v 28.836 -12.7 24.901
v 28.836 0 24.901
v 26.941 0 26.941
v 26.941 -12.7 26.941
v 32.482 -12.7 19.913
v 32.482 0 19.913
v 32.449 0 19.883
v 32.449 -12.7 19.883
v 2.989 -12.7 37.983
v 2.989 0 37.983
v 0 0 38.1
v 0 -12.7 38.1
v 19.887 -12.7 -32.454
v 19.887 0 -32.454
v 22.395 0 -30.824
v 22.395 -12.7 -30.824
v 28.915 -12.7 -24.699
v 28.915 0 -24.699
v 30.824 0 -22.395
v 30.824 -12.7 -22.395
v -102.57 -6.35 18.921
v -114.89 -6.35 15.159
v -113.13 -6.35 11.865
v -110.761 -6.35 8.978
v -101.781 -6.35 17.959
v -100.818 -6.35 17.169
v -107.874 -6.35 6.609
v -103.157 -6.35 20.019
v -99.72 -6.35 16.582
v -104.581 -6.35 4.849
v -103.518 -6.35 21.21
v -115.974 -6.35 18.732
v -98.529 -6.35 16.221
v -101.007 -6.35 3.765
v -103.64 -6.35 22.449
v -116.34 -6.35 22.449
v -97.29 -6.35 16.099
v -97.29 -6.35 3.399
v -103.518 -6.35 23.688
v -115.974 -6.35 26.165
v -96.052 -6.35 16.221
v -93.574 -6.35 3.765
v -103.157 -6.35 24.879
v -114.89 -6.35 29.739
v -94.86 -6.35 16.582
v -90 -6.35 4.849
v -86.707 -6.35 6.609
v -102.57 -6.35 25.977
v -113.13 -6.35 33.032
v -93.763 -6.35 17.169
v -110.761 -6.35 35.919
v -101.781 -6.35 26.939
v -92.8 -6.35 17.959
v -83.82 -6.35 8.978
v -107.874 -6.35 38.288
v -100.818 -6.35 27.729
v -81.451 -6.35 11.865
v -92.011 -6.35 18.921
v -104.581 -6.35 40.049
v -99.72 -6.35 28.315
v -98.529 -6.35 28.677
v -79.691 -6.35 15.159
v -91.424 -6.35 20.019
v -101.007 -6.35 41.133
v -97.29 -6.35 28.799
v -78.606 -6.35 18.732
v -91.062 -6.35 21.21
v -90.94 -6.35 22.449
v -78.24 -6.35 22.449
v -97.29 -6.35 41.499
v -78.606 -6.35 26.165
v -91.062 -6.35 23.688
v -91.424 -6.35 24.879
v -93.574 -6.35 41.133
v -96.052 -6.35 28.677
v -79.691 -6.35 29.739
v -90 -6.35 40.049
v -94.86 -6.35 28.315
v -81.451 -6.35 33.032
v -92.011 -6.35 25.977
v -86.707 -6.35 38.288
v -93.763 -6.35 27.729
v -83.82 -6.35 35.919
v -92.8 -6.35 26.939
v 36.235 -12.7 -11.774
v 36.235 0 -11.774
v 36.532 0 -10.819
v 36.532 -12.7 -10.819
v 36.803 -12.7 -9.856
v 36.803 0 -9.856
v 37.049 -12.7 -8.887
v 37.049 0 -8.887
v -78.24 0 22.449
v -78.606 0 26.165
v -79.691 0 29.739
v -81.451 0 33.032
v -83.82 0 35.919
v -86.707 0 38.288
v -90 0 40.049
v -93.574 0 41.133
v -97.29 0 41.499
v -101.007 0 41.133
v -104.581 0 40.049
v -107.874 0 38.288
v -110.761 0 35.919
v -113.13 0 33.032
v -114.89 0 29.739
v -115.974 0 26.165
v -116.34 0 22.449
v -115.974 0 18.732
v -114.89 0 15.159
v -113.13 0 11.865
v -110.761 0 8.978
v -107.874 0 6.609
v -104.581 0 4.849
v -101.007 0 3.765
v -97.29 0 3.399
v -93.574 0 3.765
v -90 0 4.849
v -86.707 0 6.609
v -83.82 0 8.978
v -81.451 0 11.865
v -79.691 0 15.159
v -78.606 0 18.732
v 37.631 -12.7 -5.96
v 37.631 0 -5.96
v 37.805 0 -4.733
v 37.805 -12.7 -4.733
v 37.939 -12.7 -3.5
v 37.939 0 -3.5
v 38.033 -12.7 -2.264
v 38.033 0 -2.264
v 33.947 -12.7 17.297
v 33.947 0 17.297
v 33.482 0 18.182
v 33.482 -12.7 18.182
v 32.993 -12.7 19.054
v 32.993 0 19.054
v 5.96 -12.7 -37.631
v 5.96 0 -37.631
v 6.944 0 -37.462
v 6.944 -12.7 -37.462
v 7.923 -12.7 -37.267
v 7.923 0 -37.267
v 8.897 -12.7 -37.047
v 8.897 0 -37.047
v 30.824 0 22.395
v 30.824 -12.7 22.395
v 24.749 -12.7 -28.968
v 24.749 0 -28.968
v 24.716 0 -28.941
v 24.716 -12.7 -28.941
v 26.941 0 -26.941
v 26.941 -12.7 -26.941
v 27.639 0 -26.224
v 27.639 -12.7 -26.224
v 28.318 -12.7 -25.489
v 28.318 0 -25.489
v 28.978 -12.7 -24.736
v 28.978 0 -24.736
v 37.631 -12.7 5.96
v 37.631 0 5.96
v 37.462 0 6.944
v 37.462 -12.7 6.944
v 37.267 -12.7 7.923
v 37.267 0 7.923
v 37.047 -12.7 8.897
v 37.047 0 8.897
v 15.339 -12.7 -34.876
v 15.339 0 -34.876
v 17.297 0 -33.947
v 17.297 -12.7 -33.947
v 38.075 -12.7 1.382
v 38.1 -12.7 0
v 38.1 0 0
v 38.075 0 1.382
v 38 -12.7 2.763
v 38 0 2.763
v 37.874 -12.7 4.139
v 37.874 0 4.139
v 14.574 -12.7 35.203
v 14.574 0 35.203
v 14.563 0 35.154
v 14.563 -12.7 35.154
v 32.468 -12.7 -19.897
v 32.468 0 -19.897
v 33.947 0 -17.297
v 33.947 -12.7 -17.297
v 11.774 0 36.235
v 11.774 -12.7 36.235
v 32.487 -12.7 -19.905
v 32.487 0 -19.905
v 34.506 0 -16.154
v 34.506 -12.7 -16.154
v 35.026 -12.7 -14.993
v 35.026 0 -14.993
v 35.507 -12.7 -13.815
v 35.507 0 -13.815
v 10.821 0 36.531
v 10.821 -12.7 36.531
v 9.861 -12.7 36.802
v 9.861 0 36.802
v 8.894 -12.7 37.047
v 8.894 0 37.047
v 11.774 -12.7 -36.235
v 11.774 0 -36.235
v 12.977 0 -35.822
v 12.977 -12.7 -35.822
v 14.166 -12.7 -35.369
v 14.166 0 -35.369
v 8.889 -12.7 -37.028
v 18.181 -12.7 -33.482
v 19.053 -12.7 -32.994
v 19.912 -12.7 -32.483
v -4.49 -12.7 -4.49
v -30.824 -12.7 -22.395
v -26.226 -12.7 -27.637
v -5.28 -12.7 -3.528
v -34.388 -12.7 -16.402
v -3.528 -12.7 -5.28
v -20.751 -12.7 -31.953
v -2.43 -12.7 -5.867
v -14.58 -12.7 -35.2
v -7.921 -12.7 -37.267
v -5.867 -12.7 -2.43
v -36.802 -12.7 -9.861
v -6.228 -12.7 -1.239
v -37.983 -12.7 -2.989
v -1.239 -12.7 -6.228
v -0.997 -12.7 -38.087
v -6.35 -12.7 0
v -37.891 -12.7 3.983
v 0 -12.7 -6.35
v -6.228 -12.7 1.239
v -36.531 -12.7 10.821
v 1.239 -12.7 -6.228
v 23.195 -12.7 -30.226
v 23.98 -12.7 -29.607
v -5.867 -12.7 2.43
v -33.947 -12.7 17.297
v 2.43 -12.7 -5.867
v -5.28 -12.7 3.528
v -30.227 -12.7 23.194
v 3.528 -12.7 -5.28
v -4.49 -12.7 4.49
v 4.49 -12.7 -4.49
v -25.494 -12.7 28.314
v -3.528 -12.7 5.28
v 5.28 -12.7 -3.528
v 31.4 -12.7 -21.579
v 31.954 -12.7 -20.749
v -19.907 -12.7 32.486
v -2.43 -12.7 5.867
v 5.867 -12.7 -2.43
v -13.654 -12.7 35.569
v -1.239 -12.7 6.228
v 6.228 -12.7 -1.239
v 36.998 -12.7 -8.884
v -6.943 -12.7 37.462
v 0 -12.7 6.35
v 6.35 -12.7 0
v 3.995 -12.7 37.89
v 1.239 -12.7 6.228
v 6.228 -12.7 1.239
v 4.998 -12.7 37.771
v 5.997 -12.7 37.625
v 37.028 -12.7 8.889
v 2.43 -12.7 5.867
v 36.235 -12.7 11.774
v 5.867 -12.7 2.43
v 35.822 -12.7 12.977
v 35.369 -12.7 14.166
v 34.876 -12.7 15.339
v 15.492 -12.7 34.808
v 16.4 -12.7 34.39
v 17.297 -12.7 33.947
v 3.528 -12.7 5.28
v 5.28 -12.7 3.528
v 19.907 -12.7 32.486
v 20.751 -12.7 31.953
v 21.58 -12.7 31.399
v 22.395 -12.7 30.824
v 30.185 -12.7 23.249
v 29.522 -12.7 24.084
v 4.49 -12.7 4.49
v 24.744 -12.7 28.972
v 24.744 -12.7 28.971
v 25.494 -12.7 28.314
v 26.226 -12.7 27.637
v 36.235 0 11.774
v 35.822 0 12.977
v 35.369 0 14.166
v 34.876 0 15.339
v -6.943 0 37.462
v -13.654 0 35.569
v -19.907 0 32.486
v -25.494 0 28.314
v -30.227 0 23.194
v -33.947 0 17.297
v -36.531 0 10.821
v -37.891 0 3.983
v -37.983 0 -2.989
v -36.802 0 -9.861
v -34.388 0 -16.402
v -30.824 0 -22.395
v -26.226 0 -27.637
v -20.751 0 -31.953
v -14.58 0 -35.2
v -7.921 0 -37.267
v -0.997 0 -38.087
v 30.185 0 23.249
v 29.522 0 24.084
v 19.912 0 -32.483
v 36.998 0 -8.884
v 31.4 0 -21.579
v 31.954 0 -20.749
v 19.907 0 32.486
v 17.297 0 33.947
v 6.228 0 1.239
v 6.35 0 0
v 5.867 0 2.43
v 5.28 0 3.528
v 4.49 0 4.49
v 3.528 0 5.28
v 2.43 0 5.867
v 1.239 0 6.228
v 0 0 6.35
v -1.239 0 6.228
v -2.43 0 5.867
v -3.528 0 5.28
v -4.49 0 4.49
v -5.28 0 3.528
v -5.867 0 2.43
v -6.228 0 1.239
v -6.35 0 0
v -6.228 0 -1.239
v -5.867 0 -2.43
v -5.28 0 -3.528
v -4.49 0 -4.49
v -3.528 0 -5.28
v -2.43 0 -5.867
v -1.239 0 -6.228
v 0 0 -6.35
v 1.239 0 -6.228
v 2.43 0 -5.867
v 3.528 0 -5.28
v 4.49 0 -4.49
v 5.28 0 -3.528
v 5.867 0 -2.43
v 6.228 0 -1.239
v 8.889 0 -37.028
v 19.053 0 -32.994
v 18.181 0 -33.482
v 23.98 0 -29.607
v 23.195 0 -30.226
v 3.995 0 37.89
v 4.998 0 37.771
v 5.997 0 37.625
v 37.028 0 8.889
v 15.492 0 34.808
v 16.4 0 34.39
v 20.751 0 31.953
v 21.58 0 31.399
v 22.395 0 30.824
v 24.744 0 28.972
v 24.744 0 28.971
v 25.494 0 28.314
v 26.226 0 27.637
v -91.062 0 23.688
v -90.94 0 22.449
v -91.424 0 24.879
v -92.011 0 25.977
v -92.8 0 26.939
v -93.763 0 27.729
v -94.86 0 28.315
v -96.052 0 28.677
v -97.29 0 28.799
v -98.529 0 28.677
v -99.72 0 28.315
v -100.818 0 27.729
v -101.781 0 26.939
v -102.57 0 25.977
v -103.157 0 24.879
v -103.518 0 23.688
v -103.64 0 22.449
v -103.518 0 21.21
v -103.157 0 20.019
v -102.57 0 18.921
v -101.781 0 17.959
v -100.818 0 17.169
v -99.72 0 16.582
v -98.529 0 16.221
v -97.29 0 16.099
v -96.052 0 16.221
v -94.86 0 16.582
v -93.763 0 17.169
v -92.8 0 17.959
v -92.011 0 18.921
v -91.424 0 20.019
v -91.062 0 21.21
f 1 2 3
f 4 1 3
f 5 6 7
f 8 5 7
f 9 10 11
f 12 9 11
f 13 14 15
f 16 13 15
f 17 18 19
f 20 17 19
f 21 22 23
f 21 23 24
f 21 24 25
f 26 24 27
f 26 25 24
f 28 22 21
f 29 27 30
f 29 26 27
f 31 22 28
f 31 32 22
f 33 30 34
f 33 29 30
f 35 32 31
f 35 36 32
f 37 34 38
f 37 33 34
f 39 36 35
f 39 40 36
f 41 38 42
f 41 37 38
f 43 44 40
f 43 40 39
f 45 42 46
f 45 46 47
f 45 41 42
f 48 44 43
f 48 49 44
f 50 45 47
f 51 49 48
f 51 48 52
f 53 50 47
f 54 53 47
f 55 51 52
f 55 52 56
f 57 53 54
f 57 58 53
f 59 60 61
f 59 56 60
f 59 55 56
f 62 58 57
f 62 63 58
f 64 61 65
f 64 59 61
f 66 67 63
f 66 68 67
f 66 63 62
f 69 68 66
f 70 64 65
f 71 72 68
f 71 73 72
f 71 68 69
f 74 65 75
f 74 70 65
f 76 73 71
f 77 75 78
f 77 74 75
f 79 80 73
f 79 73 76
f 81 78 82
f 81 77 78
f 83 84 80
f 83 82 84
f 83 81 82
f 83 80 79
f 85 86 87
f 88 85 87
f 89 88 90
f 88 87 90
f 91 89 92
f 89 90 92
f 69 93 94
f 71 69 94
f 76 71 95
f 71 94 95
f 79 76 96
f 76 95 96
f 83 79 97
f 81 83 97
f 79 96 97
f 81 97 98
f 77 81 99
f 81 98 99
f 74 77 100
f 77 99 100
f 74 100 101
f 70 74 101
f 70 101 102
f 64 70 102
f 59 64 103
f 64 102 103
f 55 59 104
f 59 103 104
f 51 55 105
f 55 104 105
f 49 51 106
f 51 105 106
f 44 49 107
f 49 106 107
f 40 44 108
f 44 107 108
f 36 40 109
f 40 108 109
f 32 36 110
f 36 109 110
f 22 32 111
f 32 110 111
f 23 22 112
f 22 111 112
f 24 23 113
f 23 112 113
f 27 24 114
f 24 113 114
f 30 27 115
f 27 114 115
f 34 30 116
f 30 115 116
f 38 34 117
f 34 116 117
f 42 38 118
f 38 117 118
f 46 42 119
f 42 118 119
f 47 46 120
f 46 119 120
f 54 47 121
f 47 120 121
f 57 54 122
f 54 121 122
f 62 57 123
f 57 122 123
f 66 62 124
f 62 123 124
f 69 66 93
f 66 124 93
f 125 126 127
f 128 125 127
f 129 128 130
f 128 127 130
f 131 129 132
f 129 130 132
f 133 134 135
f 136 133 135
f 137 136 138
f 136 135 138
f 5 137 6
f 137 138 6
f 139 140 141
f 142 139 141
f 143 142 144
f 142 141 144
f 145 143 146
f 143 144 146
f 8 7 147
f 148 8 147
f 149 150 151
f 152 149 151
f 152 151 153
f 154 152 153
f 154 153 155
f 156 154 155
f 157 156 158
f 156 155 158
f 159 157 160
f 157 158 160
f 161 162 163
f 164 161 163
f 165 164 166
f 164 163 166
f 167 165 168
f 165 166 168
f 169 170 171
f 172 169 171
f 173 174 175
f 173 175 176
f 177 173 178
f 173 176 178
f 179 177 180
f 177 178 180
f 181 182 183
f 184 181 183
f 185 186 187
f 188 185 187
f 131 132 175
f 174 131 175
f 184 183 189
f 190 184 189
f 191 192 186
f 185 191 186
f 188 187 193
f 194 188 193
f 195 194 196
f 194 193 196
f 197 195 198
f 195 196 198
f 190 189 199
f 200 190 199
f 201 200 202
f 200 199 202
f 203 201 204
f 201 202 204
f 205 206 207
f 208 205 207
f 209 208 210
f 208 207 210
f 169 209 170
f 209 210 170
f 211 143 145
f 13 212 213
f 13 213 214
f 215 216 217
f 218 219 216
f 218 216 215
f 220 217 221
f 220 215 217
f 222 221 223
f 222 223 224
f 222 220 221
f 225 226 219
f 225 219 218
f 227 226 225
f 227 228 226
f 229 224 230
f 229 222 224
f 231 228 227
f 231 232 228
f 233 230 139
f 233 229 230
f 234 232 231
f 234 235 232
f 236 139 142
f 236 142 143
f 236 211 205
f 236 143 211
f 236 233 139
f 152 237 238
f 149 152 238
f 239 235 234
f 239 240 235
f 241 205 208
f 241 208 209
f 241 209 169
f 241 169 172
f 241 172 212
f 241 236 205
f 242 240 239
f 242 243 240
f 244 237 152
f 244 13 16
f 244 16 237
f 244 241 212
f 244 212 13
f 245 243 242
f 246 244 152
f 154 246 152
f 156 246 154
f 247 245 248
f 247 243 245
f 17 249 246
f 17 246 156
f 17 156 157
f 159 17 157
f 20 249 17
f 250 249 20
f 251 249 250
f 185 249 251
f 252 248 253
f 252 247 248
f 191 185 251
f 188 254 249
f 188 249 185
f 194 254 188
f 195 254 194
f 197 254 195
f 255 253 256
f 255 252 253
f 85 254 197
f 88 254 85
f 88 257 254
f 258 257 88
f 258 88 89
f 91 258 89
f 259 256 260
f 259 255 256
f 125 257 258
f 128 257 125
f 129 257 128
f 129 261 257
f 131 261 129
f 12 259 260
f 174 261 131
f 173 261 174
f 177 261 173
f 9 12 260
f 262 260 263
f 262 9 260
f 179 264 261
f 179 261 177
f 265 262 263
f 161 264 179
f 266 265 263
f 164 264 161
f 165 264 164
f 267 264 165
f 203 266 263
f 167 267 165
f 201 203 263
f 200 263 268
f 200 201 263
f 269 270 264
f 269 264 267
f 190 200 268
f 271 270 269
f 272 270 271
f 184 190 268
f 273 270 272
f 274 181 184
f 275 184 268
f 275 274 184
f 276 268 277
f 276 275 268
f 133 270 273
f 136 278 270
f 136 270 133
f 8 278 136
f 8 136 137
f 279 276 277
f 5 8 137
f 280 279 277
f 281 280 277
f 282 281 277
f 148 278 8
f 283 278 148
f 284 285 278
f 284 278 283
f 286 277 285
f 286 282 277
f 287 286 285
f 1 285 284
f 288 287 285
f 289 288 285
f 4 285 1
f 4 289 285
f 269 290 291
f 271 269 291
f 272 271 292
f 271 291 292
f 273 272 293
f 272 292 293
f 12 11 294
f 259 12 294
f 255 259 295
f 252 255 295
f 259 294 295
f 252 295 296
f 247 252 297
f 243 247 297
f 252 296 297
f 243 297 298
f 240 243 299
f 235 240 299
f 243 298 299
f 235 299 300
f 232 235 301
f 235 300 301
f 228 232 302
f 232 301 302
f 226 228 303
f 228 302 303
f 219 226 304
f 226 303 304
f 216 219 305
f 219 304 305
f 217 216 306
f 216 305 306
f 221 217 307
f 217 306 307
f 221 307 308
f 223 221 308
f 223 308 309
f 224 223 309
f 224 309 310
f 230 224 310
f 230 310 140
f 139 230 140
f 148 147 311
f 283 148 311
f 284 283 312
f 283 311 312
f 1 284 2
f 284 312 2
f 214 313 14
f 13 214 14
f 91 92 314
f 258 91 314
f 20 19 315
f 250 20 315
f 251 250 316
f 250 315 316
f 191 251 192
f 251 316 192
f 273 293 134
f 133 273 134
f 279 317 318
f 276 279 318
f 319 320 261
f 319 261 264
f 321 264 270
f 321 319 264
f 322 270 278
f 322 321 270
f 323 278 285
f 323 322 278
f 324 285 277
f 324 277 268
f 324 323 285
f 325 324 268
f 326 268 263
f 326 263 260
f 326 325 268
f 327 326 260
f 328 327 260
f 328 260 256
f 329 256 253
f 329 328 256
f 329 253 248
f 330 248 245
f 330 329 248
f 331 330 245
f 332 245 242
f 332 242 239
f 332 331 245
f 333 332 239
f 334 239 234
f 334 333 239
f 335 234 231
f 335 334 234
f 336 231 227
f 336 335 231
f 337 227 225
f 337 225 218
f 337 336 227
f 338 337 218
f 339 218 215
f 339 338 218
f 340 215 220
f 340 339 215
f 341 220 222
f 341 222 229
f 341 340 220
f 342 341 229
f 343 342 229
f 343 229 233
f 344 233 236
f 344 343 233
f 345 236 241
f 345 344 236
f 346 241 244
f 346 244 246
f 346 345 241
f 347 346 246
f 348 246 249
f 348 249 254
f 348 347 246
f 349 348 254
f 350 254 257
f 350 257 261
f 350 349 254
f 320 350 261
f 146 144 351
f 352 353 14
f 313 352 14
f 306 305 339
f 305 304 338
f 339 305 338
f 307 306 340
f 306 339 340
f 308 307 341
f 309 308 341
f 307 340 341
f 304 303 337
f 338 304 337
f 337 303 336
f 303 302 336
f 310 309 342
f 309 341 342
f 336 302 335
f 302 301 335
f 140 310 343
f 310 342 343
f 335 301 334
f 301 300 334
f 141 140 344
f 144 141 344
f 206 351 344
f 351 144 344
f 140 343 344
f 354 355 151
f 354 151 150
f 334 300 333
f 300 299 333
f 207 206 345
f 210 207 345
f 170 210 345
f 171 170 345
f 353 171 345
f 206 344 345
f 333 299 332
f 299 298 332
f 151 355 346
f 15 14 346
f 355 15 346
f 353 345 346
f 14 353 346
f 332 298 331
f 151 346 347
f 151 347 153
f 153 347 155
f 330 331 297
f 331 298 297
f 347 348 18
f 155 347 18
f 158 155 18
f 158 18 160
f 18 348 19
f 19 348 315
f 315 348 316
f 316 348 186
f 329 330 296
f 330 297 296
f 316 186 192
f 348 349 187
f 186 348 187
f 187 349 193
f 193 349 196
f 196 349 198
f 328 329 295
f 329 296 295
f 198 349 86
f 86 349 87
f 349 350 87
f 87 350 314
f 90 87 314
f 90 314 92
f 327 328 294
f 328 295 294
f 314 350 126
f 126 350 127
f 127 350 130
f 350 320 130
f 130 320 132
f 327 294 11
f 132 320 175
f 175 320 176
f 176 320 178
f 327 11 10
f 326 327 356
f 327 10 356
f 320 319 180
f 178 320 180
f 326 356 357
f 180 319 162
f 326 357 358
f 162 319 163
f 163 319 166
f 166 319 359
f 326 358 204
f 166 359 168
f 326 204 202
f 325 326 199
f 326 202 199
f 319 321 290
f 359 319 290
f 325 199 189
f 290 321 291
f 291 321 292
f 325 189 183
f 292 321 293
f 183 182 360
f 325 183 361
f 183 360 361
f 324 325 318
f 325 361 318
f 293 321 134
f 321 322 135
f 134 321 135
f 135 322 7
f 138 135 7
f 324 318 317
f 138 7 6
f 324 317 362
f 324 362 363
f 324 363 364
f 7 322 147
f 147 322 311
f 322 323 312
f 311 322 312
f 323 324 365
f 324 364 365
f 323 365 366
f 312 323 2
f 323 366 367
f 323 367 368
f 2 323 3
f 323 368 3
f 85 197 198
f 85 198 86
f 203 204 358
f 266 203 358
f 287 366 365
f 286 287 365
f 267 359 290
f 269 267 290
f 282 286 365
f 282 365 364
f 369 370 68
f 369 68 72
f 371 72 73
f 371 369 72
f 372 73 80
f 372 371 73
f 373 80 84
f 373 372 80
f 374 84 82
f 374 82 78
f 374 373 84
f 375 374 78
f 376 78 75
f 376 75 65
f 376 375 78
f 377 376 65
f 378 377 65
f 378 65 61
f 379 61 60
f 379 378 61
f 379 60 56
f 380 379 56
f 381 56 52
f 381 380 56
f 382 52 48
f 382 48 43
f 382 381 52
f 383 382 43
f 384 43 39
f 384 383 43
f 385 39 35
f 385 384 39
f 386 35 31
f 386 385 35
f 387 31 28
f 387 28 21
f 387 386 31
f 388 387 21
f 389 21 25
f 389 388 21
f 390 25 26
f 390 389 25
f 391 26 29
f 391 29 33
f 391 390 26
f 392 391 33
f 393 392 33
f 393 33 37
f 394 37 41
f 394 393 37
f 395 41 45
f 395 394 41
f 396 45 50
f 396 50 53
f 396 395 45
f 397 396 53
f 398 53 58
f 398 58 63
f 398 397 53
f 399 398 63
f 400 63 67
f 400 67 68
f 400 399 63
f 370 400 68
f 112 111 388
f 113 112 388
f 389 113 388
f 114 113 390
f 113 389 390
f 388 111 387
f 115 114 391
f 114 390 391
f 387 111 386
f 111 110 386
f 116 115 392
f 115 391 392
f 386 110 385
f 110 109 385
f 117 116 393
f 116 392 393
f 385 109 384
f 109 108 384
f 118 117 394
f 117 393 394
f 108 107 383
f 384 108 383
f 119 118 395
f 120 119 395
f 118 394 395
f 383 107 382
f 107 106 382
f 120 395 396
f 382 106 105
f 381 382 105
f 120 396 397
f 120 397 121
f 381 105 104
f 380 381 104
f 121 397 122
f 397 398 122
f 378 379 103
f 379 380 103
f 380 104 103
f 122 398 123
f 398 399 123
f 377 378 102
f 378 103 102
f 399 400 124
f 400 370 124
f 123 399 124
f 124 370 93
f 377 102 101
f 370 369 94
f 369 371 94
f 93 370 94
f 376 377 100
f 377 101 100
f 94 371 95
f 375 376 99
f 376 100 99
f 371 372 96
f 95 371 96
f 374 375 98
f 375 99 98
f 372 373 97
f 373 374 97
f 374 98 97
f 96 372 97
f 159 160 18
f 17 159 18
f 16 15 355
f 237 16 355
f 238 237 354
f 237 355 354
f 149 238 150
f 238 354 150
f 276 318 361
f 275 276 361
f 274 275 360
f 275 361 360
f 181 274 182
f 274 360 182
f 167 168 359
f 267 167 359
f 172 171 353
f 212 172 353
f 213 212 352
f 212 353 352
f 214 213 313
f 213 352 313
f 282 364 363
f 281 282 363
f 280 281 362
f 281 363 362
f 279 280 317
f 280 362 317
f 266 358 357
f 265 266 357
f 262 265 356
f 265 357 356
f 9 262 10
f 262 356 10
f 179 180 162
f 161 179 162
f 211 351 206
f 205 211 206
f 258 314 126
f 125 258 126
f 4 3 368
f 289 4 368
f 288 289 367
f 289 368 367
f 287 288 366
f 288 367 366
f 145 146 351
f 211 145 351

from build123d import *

# Parameters (mm, degrees)
F0_R     = 6.35
F1_DEPTH = 12.7
F2_R     = 19.05
F2_R_2   = 6.35
F3_DEPTH = 6.35


# Not quite as in the source:
# - ends of sketch curves that miss each other by under 0.0002 mm in the source are joined
# - a feature names something its author has since deleted; it is built from what else it names


with BuildPart() as f1:
    # F0 (on Front) → F1 (new body)
    with BuildSketch(Plane.XZ):
        with BuildLine():
            Line((28.8364005243, 24.9012450452), (26.9407683632, 26.9407683632))
            ThreePointArc((26.9407683632, 26.9407683632), (25.8623084048, 27.9776876095), (24.7439706414, 28.9714672894))
            ThreePointArc((24.7439706414, 28.9714672894), (24.7438711101, 28.9715522968), (24.7437715786, 28.9716373038))
            Line((24.7437715786, 28.9716373038), (22.3946181123, 30.8235474857))
            ThreePointArc((22.3946181123, 30.8235474857), (21.167225878, 31.6789922287), (19.9071953157, 32.4855902619))
            Line((19.9071953157, 32.4855902619), (17.2970380401, 33.9473485716))
            ThreePointArc((17.2970380401, 33.9473485716), (15.9476707836, 34.6017600214), (14.5735950651, 35.2025613682))
            Line((14.5735950651, 35.2025613682), (14.5628412955, 35.1538197769))
            Line((14.5628412955, 35.1538197769), (11.7735474857, 36.2352532708))
            ThreePointArc((11.7735474857, 36.2352532708), (10.3418811399, 36.6695445089), (8.8942683629, 37.0472939672))
            Line((8.8942683629, 37.0472939672), (5.9973227219, 37.6250198694))
            ThreePointArc((5.9973227219, 37.6250198694), (4.4968617978, 37.8336917835), (2.9892915472, 37.9825504152))
            Line((2.9892915472, 37.9825504152), (0, 38.1))
            ThreePointArc((0, 38.1), (-37.9825504152, -2.9892915472), (5.960153118, -37.6309257767))
            ThreePointArc((5.960153118, -37.6309257767), (7.4344130557, -37.3676263966), (8.8971866639, -37.0465932235))
            Line((8.8971866639, -37.0465932235), (8.8889522061, -37.0282024699))
            Line((8.8889522061, -37.0282024699), (11.7735474857, -36.2352532708))
            ThreePointArc((11.7735474857, -36.2352532708), (13.5733548782, -35.6001971533), (15.3391019224, -34.8758075493))
            Line((15.3391019224, -34.8758075493), (17.2970380401, -33.9473485716))
            ThreePointArc((17.2970380401, -33.9473485716), (18.6188813116, -33.2407469637), (19.9119094402, -32.4827009721))
            Line((19.9119094402, -32.4827009721), (19.8866817155, -32.4544715762))
            Line((19.8866817155, -32.4544715762), (22.3946181123, -30.8235474857))
            ThreePointArc((22.3946181123, -30.8235474857), (23.5898681595, -29.91869182), (24.7485963101, -28.9675159563))
            Line((24.7485963101, -28.9675159563), (24.716211253, -28.9410193531))
            Line((24.716211253, -28.9410193531), (26.9407683632, -26.9407683632))
            ThreePointArc((26.9407683632, -26.9407683632), (27.9811639514, -25.8585472122), (28.9781187619, -24.7361806474))
            Line((28.9781187619, -24.7361806474), (28.9154423412, -24.6986999505))
            Line((28.9154423412, -24.6986999505), (30.8235474857, -22.3946181123))
            ThreePointArc((30.8235474857, -22.3946181123), (31.6798259077, -21.1659781361), (32.4871583117, -19.9046362646))
            Line((32.4871583117, -19.9046362646), (32.4683314442, -19.897454679))
            Line((32.4683314442, -19.897454679), (33.9473485716, -17.2970380401))
            ThreePointArc((33.9473485716, -17.2970380401), (34.7709520965, -15.5753295408), (35.5073030041, -13.8145370308))
            Line((35.5073030041, -13.8145370308), (36.2352532708, -11.7735474857))
            ThreePointArc((36.2352532708, -11.7735474857), (36.670535285, -10.3383674684), (37.0489977594, -8.8871685607))
            Line((37.0489977594, -8.8871685607), (36.998361761, -8.8841095345))
            Line((36.998361761, -8.8841095345), (37.6309257767, -5.960153118))
            ThreePointArc((37.6309257767, -5.960153118), (37.8769274813, -4.1168391485), (38.0326909965, -2.2637171999))
            Line((38.0326909965, -2.2637171999), (38.1, 0))
            ThreePointArc((38.1, 0), (38.0435762549, 2.0727531781), (37.8744721398, 4.1393671175))
            Line((37.8744721398, 4.1393671175), (37.6309257767, 5.960153118))
            ThreePointArc((37.6309257767, 5.960153118), (37.3676263966, 7.4344130557), (37.0465932235, 8.8971866639))
            Line((37.0465932235, 8.8971866639), (37.0282024699, 8.8889522061))
            Line((37.0282024699, 8.8889522061), (36.2352532708, 11.7735474857))
            ThreePointArc((36.2352532708, 11.7735474857), (35.6001971533, 13.5733548782), (34.8758075493, 15.3391019224))
            Line((34.8758075493, 15.3391019224), (33.9473485716, 17.2970380401))
            ThreePointArc((33.9473485716, 17.2970380401), (33.24052825, 18.6192717812), (32.4822331625, 19.9126725674))
            Line((32.4822331625, 19.9126725674), (32.4491315845, 19.8832171692))
            Line((32.4491315845, 19.8832171692), (30.8235474857, 22.3946181123))
            ThreePointArc((30.8235474857, 22.3946181123), (29.8562915276, 23.6687949887), (28.8364005243, 24.9012450452))
        make_face()
        Circle(F0_R, mode=Mode.SUBTRACT)
    extrude(amount=F1_DEPTH)


with BuildPart() as f3:
    # F2 (on Front) → F3 (new body)
    with BuildSketch(Plane.XZ):
        with Locations((-97.2904128466, 22.4488124817)):
            Circle(F2_R)
        with Locations((-97.2904128466, 22.4488124817)):
            Circle(F2_R_2, mode=Mode.SUBTRACT)
    extrude(amount=F3_DEPTH)


solid = Compound([f1.part, f3.part])
